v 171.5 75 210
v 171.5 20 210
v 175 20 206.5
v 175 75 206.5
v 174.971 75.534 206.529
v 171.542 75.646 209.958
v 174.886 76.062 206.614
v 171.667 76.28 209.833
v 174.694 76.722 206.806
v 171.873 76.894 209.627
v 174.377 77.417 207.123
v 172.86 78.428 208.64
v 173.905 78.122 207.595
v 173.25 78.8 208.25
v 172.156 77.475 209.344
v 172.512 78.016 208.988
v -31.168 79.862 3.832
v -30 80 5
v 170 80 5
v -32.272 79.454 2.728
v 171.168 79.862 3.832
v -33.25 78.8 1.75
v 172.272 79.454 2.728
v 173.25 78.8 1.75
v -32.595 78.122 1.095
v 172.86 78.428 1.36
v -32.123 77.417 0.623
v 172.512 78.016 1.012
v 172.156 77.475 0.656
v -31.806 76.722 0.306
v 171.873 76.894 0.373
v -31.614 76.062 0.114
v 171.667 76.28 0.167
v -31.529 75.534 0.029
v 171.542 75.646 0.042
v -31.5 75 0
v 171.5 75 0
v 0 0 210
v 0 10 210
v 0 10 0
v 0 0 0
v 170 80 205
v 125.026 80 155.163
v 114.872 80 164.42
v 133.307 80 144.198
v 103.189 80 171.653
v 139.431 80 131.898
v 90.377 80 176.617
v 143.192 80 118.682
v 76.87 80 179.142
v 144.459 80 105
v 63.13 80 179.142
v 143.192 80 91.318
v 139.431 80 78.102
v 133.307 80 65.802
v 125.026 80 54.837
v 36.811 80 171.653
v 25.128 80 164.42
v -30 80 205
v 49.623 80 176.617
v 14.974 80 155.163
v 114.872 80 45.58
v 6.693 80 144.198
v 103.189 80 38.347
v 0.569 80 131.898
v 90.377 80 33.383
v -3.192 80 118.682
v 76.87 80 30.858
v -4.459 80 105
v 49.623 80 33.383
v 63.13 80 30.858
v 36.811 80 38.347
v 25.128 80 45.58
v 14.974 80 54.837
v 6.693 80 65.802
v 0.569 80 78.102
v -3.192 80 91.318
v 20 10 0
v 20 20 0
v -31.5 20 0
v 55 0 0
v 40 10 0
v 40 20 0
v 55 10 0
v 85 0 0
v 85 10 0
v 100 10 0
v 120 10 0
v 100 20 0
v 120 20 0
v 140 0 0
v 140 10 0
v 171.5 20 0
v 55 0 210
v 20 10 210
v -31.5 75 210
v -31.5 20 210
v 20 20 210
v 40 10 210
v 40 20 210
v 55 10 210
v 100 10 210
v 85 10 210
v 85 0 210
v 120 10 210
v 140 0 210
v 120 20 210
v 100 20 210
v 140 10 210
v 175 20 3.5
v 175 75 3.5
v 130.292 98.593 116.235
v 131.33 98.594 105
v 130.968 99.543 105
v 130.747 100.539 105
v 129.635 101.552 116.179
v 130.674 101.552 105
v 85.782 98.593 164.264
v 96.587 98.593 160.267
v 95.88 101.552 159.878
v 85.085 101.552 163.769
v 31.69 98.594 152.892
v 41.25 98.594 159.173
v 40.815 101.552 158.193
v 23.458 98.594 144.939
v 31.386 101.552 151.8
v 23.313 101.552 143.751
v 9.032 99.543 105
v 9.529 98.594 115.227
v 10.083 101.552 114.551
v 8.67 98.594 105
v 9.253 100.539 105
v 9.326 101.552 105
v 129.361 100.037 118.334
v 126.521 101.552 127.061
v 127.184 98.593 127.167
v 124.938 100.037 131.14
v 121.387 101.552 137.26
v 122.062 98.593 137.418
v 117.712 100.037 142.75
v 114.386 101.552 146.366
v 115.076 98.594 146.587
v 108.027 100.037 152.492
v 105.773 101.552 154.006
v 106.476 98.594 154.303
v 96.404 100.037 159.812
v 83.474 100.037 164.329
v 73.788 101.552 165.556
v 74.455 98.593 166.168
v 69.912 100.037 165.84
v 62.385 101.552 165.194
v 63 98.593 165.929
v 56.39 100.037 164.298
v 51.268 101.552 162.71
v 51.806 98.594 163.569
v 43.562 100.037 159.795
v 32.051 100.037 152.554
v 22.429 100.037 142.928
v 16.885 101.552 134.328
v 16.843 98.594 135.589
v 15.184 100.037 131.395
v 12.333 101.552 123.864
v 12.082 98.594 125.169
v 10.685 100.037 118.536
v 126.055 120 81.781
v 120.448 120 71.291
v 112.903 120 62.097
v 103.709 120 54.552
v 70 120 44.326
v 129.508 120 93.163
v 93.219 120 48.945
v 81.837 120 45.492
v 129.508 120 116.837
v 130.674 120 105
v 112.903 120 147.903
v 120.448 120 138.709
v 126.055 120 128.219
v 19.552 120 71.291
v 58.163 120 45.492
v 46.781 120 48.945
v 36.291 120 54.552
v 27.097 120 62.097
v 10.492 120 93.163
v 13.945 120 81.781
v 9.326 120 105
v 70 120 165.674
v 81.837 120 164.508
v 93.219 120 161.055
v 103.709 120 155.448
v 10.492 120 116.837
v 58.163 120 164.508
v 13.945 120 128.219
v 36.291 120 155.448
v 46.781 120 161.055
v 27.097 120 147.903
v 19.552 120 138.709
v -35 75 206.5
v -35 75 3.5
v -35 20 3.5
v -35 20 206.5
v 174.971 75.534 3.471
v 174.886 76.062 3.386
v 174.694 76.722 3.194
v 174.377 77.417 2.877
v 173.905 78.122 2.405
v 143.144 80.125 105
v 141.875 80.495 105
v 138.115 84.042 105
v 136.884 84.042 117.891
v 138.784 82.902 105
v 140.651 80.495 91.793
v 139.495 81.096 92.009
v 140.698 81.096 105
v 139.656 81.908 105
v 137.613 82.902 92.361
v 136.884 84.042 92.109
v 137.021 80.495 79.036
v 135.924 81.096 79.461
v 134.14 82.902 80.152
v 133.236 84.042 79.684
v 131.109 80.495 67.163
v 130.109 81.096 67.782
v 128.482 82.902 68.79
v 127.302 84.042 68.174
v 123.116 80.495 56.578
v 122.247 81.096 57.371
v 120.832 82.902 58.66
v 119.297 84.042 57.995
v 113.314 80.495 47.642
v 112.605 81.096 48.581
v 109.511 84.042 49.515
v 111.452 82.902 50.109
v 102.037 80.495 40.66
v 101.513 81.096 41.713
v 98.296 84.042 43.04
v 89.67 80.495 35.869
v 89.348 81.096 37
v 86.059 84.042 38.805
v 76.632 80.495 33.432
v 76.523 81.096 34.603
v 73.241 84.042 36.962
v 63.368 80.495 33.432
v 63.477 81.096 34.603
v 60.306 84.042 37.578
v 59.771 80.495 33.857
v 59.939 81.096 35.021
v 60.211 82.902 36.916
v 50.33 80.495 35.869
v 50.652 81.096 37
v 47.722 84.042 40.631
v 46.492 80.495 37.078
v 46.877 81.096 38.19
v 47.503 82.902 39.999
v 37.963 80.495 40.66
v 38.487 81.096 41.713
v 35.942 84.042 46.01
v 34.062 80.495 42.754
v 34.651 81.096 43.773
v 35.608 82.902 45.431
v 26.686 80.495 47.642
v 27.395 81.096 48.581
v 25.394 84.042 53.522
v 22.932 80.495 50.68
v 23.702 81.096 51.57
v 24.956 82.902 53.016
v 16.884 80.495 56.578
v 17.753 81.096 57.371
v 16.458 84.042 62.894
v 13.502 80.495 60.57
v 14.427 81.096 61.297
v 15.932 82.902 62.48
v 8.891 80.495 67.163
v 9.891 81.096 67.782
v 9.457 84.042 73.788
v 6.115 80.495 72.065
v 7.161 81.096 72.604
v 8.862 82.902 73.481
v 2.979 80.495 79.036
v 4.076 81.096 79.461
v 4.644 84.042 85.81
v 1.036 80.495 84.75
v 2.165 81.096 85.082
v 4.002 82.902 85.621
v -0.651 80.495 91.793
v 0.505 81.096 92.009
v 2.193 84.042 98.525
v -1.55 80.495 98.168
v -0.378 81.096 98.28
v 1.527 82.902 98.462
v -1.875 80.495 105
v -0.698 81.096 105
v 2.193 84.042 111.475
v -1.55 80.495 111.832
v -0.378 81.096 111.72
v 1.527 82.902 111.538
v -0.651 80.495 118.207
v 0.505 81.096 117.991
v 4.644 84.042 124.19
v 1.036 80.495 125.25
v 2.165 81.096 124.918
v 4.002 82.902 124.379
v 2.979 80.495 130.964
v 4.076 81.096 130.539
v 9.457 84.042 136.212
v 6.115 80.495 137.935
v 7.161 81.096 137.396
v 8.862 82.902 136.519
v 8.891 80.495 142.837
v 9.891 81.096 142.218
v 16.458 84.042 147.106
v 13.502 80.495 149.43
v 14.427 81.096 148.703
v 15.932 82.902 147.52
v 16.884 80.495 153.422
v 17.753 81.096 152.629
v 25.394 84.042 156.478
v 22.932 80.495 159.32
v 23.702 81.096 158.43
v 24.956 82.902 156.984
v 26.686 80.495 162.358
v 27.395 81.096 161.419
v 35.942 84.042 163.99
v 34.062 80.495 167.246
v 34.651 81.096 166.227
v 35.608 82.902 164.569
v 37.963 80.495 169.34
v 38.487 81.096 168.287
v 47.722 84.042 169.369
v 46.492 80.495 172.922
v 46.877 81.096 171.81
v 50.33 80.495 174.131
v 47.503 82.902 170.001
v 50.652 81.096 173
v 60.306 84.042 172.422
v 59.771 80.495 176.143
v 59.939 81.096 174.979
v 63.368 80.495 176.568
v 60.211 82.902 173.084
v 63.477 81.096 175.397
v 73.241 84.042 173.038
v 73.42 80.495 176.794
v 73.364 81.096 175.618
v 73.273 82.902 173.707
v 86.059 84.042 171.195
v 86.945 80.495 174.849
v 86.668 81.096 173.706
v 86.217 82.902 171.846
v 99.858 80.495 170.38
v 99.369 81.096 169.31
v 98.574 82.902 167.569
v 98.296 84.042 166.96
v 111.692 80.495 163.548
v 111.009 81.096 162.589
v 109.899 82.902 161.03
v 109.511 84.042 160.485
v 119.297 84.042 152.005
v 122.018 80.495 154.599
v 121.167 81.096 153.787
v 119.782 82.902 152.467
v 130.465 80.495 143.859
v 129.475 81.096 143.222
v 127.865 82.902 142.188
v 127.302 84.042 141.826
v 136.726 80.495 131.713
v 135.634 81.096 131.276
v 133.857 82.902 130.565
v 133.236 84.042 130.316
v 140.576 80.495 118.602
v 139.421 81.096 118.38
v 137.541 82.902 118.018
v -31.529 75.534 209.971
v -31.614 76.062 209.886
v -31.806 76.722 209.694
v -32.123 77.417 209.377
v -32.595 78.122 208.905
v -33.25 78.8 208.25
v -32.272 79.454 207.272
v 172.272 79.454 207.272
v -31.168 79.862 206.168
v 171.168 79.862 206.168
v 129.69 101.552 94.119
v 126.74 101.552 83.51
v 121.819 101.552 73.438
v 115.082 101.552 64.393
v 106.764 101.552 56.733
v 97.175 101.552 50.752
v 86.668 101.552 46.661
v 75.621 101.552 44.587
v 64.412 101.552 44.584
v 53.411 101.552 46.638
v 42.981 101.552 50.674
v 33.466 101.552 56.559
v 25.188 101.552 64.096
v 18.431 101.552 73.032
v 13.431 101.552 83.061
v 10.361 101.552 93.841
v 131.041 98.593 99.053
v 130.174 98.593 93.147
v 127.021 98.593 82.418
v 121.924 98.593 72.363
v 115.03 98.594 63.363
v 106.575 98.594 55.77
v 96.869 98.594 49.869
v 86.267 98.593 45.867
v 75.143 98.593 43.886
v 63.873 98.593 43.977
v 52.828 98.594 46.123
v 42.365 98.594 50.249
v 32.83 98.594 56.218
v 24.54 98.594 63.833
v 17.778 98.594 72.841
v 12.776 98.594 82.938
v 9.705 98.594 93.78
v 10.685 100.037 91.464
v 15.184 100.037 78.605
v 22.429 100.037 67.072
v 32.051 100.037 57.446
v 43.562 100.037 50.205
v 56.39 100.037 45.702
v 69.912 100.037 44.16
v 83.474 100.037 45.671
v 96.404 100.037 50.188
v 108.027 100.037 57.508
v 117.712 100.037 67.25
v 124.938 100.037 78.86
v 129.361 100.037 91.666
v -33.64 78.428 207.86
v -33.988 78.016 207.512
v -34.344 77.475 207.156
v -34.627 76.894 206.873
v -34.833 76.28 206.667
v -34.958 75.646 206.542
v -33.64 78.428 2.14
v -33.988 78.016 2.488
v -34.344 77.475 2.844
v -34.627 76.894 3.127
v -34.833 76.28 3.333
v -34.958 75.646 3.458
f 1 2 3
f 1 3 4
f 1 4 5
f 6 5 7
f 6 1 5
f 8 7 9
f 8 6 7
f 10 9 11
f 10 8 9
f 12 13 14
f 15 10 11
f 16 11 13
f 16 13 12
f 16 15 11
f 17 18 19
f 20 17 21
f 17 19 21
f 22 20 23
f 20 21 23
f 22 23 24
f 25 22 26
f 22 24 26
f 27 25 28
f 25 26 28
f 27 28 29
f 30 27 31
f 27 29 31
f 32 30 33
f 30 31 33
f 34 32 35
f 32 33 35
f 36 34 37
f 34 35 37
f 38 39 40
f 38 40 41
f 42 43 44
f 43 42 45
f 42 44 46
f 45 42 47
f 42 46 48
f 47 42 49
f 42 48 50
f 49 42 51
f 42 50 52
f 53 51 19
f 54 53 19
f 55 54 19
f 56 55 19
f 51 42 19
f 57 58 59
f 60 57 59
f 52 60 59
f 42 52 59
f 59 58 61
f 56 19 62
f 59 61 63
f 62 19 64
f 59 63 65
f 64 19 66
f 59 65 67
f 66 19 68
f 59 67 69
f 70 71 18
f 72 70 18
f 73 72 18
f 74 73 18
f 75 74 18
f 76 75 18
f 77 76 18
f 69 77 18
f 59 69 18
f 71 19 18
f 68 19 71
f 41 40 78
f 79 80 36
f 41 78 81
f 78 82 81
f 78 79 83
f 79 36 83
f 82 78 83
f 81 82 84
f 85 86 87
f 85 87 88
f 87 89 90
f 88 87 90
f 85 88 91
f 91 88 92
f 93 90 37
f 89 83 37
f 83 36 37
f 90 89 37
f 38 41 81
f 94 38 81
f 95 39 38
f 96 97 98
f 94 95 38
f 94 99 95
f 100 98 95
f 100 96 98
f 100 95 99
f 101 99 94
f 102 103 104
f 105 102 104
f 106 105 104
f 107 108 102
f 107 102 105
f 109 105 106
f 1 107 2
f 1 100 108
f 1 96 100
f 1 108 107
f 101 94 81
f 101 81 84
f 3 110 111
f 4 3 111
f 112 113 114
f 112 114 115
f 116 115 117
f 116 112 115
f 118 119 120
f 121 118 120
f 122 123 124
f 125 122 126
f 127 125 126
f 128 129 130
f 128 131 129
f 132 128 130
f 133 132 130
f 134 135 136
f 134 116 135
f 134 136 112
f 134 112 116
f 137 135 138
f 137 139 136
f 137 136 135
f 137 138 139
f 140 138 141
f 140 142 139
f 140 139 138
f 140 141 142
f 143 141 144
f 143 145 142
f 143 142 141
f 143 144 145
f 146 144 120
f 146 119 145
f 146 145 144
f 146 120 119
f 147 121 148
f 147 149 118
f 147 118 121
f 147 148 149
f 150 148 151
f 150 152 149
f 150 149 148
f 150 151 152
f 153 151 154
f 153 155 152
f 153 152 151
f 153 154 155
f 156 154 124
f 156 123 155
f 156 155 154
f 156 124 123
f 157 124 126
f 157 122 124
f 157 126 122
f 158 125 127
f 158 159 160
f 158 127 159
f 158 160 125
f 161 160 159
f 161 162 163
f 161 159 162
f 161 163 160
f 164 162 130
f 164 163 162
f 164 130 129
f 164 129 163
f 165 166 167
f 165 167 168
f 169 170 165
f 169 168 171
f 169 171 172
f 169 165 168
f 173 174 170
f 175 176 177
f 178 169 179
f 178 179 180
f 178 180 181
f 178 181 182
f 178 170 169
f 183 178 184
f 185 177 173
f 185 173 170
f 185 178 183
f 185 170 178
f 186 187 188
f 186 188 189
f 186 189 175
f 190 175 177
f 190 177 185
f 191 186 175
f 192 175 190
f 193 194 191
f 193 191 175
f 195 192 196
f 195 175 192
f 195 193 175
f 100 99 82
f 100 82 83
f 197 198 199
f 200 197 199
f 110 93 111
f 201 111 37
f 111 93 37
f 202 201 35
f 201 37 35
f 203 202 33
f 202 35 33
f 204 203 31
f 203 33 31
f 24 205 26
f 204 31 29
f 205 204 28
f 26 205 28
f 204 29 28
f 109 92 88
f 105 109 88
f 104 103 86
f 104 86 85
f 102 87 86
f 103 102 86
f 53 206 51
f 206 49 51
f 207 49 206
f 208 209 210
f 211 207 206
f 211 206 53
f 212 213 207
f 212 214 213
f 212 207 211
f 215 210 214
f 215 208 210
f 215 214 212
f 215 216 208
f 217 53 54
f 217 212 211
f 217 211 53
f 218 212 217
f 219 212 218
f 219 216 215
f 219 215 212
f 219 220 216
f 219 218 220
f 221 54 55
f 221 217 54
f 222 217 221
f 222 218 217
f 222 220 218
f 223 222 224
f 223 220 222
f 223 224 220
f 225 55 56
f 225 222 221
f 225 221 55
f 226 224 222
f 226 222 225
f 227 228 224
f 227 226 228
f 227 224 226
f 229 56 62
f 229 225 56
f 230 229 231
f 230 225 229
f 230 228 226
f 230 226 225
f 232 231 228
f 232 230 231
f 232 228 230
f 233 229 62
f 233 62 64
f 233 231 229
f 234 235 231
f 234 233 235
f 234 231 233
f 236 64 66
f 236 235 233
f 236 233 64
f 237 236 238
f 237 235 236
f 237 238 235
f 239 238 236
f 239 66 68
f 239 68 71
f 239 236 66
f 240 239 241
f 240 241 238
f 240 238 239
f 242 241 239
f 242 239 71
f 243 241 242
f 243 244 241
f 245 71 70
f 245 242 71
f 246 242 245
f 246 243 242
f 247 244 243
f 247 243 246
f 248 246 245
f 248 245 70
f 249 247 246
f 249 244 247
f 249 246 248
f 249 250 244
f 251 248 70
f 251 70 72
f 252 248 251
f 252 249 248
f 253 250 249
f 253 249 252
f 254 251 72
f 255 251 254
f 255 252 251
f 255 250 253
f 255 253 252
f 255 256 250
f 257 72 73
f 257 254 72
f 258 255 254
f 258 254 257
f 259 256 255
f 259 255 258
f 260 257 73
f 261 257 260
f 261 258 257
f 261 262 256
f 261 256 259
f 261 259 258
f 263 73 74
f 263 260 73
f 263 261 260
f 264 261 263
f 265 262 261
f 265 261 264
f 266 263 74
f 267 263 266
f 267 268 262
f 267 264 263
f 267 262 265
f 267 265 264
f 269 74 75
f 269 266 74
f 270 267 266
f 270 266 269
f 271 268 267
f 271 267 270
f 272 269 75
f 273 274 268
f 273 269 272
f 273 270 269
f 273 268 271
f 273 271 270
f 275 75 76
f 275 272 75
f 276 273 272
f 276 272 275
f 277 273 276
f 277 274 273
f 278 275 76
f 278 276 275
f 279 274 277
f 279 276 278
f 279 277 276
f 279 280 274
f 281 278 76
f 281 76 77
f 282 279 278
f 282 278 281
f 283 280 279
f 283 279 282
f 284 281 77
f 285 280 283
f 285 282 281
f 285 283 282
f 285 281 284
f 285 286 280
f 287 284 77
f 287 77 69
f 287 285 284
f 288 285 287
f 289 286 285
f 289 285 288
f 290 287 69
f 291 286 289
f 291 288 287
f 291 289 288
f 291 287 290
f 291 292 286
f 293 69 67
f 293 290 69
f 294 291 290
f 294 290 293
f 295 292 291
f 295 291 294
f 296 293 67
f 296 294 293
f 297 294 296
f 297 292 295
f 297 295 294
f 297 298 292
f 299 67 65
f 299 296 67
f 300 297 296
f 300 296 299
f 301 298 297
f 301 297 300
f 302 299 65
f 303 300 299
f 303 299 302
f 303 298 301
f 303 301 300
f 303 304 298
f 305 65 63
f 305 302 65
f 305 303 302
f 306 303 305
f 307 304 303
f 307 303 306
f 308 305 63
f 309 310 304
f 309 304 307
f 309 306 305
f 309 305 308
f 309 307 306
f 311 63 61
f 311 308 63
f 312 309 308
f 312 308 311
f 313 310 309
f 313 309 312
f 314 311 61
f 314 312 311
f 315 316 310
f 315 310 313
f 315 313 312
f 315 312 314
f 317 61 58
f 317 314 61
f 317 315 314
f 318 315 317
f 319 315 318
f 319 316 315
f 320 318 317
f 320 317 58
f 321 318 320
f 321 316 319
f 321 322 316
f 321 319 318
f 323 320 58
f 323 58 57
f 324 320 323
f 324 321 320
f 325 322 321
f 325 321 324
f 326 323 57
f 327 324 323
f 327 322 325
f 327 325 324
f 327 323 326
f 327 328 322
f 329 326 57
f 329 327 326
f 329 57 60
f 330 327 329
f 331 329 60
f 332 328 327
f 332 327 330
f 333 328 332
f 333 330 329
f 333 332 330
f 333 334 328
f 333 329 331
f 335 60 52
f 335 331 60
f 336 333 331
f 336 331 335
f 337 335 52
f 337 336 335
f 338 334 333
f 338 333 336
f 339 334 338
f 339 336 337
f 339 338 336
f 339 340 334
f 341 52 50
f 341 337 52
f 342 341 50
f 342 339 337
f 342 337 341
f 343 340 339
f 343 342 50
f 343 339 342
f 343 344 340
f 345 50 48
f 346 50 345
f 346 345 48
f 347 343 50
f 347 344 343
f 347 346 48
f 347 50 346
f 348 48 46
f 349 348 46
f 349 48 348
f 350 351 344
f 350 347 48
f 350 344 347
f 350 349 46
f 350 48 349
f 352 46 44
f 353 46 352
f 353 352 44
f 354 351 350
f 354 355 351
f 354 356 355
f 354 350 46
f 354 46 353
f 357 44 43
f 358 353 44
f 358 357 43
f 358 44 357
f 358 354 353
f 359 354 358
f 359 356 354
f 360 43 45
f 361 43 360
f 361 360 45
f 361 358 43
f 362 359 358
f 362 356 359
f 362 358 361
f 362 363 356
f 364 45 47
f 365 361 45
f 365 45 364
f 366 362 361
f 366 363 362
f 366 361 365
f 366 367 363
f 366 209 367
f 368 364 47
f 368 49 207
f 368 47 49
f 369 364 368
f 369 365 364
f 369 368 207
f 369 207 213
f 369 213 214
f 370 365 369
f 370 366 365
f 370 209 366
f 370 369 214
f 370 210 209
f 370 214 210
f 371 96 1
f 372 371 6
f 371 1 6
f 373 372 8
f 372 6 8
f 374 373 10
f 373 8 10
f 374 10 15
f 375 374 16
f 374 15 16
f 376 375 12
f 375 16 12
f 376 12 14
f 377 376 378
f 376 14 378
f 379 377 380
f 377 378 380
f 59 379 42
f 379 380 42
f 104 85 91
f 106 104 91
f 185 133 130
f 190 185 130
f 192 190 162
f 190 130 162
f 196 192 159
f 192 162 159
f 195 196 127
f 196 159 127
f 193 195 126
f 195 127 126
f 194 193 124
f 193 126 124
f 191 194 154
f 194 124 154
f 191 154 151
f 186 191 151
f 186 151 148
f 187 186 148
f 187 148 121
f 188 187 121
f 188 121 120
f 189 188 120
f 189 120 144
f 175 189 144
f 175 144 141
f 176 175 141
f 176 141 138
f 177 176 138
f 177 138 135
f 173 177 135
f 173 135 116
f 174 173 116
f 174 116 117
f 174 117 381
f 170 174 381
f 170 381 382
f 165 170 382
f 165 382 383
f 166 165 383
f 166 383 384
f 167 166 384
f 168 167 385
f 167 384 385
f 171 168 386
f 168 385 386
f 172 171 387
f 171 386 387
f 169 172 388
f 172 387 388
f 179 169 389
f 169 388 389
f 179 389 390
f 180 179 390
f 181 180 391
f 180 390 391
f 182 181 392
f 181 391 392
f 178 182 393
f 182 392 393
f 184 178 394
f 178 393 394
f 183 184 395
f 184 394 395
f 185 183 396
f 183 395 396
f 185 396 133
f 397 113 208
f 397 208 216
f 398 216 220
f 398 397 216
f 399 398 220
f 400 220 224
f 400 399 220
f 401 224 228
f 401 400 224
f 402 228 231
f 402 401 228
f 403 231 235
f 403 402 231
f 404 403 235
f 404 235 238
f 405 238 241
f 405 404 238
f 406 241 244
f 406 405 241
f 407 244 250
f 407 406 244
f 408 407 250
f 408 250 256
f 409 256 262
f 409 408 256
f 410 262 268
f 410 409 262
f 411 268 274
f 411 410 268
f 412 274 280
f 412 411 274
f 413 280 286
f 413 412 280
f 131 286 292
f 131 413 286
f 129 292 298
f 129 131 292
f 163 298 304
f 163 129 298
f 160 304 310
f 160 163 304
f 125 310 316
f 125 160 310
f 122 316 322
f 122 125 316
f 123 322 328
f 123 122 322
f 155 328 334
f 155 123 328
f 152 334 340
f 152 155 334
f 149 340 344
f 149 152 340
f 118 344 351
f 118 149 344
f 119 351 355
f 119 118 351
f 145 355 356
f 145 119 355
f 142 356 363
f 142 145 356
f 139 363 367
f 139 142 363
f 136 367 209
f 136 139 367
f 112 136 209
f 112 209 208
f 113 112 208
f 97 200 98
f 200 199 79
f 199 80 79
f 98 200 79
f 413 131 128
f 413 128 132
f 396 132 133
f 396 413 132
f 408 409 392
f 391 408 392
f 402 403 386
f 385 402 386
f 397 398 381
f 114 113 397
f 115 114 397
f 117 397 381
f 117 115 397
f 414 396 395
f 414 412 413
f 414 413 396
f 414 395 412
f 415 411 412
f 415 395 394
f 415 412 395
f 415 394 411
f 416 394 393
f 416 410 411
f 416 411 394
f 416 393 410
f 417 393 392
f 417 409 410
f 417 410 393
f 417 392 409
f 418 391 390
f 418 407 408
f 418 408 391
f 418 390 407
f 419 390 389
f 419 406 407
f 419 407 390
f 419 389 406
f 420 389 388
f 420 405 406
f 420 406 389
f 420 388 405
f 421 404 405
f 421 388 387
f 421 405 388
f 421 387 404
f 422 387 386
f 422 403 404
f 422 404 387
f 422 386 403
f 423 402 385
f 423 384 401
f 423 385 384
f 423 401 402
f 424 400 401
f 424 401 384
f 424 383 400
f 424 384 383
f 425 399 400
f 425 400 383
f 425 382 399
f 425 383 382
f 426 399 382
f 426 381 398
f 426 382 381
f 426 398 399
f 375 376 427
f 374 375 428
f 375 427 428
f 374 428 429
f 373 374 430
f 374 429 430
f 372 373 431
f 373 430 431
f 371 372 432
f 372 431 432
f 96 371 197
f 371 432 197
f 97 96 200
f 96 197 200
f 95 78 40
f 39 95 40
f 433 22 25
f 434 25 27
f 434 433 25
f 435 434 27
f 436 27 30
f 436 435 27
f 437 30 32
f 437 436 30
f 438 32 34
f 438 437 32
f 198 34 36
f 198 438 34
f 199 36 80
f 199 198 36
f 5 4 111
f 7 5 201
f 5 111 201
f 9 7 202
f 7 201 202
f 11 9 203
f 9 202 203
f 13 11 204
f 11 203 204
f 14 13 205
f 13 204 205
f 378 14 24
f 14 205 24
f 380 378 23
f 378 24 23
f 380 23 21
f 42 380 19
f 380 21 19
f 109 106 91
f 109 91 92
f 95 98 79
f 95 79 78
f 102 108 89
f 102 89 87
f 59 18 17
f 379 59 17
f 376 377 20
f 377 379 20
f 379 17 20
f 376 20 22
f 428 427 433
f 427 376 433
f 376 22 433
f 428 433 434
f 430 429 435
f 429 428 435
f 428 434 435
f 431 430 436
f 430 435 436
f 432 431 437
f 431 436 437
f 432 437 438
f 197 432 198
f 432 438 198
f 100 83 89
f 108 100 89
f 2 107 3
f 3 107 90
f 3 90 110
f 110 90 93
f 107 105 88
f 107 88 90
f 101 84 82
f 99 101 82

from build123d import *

# Parameters (mm, degrees)
BOSS_EXTRUDE1_DEPTH = 210
SKETCH3_R           = 70
BOSS_EXTRUDE2_DEPTH = 20
BOSS_EXTRUDE2_TAPER = 25
SKETCH4_R           = 60.673846837
BOSS_EXTRUDE3_DEPTH = 20
CHAMFER1_SIZE       = 3.5
FILLET1_R           = 7
FILLET2_R           = 5


with BuildPart() as part:
    # Sketch2 → Boss-Extrude1 (new body)
    with BuildSketch(Plane.XY):
        Polygon((0, 0), (55, 0), (55, 10), (40, 10), (40, 20), (100, 20), (100, 10), (85, 10), (85, 0), (140, 0), (140, 10), (120, 10), (120, 20), (175, 20), (175, 80), (-35, 80), (-35, 20), (20, 20), (20, 10), (0, 10), align=None)
    extrude(amount=BOSS_EXTRUDE1_DEPTH)

    # Sketch3 → Boss-Extrude2 (add)
    with BuildSketch(Plane(origin=(0, 80, 0), x_dir=(1, 0, 0), z_dir=(0, 1, 0))):
        with Locations((70, -105)):
            Circle(SKETCH3_R)
    extrude(amount=BOSS_EXTRUDE2_DEPTH, taper=BOSS_EXTRUDE2_TAPER)

    # Sketch4 → Boss-Extrude3 (add)
    with BuildSketch(Plane(origin=(0, 100, 0), x_dir=(1, 0, 0), z_dir=(0, 1, 0))):
        with Locations(Location((70, -105, 0), (0, 0, 180))):
            Circle(SKETCH4_R)
    extrude(amount=BOSS_EXTRUDE3_DEPTH)

    # Chamfer1
    chamfer1_edges = [part.edges().sort_by_distance(p)[0] for p in [
        (-35, 50, 0),
        (175, 50, 0),
        (175, 50, 210),
        (-35, 50, 210),
    ]]
    chamfer(chamfer1_edges, length=CHAMFER1_SIZE)

    # Fillet1
    fillet1_edges = [part.edges().sort_by_distance(p)[0] for p in [
        (0, 80, 105),
        (70, 100, 44.326153163),
    ]]
    fillet(fillet1_edges, radius=FILLET1_R)

    # Fillet2
    # the kernel refuses this fillet: 5 mm, written as the material it takes off along each edge
    with BuildSketch(Plane(origin=(-35, 80, -9), x_dir=(1, 0, 0), z_dir=(0, 0, 1)), Plane(origin=(184, 80, 0), x_dir=(0, 0, 1), z_dir=(-1, 0, 0))) as fillet2_piece_1:
        with BuildLine():
            CenterArc((FILLET2_R, -FILLET2_R), FILLET2_R, 90, 90)
            Line((0, -FILLET2_R), (0, 0))
            Line((0, 0), (FILLET2_R, 0))
        make_face()
    extrude(amount=228, mode=Mode.SUBTRACT)
    with BuildSketch(Plane(origin=(175, 80, -9), x_dir=(-1, 0, 0), z_dir=(0, 0, 1)), Plane(origin=(184, 80, 210), x_dir=(0, 0, -1), z_dir=(-1, 0, 0))) as fillet2_piece_2:
        with BuildLine():
            CenterArc((FILLET2_R, FILLET2_R), FILLET2_R, 180, 90)
            Line((0, FILLET2_R), (0, 0))
            Line((0, 0), (FILLET2_R, 0))
        make_face()
    extrude(amount=228, mode=Mode.SUBTRACT)


solid = part.part
